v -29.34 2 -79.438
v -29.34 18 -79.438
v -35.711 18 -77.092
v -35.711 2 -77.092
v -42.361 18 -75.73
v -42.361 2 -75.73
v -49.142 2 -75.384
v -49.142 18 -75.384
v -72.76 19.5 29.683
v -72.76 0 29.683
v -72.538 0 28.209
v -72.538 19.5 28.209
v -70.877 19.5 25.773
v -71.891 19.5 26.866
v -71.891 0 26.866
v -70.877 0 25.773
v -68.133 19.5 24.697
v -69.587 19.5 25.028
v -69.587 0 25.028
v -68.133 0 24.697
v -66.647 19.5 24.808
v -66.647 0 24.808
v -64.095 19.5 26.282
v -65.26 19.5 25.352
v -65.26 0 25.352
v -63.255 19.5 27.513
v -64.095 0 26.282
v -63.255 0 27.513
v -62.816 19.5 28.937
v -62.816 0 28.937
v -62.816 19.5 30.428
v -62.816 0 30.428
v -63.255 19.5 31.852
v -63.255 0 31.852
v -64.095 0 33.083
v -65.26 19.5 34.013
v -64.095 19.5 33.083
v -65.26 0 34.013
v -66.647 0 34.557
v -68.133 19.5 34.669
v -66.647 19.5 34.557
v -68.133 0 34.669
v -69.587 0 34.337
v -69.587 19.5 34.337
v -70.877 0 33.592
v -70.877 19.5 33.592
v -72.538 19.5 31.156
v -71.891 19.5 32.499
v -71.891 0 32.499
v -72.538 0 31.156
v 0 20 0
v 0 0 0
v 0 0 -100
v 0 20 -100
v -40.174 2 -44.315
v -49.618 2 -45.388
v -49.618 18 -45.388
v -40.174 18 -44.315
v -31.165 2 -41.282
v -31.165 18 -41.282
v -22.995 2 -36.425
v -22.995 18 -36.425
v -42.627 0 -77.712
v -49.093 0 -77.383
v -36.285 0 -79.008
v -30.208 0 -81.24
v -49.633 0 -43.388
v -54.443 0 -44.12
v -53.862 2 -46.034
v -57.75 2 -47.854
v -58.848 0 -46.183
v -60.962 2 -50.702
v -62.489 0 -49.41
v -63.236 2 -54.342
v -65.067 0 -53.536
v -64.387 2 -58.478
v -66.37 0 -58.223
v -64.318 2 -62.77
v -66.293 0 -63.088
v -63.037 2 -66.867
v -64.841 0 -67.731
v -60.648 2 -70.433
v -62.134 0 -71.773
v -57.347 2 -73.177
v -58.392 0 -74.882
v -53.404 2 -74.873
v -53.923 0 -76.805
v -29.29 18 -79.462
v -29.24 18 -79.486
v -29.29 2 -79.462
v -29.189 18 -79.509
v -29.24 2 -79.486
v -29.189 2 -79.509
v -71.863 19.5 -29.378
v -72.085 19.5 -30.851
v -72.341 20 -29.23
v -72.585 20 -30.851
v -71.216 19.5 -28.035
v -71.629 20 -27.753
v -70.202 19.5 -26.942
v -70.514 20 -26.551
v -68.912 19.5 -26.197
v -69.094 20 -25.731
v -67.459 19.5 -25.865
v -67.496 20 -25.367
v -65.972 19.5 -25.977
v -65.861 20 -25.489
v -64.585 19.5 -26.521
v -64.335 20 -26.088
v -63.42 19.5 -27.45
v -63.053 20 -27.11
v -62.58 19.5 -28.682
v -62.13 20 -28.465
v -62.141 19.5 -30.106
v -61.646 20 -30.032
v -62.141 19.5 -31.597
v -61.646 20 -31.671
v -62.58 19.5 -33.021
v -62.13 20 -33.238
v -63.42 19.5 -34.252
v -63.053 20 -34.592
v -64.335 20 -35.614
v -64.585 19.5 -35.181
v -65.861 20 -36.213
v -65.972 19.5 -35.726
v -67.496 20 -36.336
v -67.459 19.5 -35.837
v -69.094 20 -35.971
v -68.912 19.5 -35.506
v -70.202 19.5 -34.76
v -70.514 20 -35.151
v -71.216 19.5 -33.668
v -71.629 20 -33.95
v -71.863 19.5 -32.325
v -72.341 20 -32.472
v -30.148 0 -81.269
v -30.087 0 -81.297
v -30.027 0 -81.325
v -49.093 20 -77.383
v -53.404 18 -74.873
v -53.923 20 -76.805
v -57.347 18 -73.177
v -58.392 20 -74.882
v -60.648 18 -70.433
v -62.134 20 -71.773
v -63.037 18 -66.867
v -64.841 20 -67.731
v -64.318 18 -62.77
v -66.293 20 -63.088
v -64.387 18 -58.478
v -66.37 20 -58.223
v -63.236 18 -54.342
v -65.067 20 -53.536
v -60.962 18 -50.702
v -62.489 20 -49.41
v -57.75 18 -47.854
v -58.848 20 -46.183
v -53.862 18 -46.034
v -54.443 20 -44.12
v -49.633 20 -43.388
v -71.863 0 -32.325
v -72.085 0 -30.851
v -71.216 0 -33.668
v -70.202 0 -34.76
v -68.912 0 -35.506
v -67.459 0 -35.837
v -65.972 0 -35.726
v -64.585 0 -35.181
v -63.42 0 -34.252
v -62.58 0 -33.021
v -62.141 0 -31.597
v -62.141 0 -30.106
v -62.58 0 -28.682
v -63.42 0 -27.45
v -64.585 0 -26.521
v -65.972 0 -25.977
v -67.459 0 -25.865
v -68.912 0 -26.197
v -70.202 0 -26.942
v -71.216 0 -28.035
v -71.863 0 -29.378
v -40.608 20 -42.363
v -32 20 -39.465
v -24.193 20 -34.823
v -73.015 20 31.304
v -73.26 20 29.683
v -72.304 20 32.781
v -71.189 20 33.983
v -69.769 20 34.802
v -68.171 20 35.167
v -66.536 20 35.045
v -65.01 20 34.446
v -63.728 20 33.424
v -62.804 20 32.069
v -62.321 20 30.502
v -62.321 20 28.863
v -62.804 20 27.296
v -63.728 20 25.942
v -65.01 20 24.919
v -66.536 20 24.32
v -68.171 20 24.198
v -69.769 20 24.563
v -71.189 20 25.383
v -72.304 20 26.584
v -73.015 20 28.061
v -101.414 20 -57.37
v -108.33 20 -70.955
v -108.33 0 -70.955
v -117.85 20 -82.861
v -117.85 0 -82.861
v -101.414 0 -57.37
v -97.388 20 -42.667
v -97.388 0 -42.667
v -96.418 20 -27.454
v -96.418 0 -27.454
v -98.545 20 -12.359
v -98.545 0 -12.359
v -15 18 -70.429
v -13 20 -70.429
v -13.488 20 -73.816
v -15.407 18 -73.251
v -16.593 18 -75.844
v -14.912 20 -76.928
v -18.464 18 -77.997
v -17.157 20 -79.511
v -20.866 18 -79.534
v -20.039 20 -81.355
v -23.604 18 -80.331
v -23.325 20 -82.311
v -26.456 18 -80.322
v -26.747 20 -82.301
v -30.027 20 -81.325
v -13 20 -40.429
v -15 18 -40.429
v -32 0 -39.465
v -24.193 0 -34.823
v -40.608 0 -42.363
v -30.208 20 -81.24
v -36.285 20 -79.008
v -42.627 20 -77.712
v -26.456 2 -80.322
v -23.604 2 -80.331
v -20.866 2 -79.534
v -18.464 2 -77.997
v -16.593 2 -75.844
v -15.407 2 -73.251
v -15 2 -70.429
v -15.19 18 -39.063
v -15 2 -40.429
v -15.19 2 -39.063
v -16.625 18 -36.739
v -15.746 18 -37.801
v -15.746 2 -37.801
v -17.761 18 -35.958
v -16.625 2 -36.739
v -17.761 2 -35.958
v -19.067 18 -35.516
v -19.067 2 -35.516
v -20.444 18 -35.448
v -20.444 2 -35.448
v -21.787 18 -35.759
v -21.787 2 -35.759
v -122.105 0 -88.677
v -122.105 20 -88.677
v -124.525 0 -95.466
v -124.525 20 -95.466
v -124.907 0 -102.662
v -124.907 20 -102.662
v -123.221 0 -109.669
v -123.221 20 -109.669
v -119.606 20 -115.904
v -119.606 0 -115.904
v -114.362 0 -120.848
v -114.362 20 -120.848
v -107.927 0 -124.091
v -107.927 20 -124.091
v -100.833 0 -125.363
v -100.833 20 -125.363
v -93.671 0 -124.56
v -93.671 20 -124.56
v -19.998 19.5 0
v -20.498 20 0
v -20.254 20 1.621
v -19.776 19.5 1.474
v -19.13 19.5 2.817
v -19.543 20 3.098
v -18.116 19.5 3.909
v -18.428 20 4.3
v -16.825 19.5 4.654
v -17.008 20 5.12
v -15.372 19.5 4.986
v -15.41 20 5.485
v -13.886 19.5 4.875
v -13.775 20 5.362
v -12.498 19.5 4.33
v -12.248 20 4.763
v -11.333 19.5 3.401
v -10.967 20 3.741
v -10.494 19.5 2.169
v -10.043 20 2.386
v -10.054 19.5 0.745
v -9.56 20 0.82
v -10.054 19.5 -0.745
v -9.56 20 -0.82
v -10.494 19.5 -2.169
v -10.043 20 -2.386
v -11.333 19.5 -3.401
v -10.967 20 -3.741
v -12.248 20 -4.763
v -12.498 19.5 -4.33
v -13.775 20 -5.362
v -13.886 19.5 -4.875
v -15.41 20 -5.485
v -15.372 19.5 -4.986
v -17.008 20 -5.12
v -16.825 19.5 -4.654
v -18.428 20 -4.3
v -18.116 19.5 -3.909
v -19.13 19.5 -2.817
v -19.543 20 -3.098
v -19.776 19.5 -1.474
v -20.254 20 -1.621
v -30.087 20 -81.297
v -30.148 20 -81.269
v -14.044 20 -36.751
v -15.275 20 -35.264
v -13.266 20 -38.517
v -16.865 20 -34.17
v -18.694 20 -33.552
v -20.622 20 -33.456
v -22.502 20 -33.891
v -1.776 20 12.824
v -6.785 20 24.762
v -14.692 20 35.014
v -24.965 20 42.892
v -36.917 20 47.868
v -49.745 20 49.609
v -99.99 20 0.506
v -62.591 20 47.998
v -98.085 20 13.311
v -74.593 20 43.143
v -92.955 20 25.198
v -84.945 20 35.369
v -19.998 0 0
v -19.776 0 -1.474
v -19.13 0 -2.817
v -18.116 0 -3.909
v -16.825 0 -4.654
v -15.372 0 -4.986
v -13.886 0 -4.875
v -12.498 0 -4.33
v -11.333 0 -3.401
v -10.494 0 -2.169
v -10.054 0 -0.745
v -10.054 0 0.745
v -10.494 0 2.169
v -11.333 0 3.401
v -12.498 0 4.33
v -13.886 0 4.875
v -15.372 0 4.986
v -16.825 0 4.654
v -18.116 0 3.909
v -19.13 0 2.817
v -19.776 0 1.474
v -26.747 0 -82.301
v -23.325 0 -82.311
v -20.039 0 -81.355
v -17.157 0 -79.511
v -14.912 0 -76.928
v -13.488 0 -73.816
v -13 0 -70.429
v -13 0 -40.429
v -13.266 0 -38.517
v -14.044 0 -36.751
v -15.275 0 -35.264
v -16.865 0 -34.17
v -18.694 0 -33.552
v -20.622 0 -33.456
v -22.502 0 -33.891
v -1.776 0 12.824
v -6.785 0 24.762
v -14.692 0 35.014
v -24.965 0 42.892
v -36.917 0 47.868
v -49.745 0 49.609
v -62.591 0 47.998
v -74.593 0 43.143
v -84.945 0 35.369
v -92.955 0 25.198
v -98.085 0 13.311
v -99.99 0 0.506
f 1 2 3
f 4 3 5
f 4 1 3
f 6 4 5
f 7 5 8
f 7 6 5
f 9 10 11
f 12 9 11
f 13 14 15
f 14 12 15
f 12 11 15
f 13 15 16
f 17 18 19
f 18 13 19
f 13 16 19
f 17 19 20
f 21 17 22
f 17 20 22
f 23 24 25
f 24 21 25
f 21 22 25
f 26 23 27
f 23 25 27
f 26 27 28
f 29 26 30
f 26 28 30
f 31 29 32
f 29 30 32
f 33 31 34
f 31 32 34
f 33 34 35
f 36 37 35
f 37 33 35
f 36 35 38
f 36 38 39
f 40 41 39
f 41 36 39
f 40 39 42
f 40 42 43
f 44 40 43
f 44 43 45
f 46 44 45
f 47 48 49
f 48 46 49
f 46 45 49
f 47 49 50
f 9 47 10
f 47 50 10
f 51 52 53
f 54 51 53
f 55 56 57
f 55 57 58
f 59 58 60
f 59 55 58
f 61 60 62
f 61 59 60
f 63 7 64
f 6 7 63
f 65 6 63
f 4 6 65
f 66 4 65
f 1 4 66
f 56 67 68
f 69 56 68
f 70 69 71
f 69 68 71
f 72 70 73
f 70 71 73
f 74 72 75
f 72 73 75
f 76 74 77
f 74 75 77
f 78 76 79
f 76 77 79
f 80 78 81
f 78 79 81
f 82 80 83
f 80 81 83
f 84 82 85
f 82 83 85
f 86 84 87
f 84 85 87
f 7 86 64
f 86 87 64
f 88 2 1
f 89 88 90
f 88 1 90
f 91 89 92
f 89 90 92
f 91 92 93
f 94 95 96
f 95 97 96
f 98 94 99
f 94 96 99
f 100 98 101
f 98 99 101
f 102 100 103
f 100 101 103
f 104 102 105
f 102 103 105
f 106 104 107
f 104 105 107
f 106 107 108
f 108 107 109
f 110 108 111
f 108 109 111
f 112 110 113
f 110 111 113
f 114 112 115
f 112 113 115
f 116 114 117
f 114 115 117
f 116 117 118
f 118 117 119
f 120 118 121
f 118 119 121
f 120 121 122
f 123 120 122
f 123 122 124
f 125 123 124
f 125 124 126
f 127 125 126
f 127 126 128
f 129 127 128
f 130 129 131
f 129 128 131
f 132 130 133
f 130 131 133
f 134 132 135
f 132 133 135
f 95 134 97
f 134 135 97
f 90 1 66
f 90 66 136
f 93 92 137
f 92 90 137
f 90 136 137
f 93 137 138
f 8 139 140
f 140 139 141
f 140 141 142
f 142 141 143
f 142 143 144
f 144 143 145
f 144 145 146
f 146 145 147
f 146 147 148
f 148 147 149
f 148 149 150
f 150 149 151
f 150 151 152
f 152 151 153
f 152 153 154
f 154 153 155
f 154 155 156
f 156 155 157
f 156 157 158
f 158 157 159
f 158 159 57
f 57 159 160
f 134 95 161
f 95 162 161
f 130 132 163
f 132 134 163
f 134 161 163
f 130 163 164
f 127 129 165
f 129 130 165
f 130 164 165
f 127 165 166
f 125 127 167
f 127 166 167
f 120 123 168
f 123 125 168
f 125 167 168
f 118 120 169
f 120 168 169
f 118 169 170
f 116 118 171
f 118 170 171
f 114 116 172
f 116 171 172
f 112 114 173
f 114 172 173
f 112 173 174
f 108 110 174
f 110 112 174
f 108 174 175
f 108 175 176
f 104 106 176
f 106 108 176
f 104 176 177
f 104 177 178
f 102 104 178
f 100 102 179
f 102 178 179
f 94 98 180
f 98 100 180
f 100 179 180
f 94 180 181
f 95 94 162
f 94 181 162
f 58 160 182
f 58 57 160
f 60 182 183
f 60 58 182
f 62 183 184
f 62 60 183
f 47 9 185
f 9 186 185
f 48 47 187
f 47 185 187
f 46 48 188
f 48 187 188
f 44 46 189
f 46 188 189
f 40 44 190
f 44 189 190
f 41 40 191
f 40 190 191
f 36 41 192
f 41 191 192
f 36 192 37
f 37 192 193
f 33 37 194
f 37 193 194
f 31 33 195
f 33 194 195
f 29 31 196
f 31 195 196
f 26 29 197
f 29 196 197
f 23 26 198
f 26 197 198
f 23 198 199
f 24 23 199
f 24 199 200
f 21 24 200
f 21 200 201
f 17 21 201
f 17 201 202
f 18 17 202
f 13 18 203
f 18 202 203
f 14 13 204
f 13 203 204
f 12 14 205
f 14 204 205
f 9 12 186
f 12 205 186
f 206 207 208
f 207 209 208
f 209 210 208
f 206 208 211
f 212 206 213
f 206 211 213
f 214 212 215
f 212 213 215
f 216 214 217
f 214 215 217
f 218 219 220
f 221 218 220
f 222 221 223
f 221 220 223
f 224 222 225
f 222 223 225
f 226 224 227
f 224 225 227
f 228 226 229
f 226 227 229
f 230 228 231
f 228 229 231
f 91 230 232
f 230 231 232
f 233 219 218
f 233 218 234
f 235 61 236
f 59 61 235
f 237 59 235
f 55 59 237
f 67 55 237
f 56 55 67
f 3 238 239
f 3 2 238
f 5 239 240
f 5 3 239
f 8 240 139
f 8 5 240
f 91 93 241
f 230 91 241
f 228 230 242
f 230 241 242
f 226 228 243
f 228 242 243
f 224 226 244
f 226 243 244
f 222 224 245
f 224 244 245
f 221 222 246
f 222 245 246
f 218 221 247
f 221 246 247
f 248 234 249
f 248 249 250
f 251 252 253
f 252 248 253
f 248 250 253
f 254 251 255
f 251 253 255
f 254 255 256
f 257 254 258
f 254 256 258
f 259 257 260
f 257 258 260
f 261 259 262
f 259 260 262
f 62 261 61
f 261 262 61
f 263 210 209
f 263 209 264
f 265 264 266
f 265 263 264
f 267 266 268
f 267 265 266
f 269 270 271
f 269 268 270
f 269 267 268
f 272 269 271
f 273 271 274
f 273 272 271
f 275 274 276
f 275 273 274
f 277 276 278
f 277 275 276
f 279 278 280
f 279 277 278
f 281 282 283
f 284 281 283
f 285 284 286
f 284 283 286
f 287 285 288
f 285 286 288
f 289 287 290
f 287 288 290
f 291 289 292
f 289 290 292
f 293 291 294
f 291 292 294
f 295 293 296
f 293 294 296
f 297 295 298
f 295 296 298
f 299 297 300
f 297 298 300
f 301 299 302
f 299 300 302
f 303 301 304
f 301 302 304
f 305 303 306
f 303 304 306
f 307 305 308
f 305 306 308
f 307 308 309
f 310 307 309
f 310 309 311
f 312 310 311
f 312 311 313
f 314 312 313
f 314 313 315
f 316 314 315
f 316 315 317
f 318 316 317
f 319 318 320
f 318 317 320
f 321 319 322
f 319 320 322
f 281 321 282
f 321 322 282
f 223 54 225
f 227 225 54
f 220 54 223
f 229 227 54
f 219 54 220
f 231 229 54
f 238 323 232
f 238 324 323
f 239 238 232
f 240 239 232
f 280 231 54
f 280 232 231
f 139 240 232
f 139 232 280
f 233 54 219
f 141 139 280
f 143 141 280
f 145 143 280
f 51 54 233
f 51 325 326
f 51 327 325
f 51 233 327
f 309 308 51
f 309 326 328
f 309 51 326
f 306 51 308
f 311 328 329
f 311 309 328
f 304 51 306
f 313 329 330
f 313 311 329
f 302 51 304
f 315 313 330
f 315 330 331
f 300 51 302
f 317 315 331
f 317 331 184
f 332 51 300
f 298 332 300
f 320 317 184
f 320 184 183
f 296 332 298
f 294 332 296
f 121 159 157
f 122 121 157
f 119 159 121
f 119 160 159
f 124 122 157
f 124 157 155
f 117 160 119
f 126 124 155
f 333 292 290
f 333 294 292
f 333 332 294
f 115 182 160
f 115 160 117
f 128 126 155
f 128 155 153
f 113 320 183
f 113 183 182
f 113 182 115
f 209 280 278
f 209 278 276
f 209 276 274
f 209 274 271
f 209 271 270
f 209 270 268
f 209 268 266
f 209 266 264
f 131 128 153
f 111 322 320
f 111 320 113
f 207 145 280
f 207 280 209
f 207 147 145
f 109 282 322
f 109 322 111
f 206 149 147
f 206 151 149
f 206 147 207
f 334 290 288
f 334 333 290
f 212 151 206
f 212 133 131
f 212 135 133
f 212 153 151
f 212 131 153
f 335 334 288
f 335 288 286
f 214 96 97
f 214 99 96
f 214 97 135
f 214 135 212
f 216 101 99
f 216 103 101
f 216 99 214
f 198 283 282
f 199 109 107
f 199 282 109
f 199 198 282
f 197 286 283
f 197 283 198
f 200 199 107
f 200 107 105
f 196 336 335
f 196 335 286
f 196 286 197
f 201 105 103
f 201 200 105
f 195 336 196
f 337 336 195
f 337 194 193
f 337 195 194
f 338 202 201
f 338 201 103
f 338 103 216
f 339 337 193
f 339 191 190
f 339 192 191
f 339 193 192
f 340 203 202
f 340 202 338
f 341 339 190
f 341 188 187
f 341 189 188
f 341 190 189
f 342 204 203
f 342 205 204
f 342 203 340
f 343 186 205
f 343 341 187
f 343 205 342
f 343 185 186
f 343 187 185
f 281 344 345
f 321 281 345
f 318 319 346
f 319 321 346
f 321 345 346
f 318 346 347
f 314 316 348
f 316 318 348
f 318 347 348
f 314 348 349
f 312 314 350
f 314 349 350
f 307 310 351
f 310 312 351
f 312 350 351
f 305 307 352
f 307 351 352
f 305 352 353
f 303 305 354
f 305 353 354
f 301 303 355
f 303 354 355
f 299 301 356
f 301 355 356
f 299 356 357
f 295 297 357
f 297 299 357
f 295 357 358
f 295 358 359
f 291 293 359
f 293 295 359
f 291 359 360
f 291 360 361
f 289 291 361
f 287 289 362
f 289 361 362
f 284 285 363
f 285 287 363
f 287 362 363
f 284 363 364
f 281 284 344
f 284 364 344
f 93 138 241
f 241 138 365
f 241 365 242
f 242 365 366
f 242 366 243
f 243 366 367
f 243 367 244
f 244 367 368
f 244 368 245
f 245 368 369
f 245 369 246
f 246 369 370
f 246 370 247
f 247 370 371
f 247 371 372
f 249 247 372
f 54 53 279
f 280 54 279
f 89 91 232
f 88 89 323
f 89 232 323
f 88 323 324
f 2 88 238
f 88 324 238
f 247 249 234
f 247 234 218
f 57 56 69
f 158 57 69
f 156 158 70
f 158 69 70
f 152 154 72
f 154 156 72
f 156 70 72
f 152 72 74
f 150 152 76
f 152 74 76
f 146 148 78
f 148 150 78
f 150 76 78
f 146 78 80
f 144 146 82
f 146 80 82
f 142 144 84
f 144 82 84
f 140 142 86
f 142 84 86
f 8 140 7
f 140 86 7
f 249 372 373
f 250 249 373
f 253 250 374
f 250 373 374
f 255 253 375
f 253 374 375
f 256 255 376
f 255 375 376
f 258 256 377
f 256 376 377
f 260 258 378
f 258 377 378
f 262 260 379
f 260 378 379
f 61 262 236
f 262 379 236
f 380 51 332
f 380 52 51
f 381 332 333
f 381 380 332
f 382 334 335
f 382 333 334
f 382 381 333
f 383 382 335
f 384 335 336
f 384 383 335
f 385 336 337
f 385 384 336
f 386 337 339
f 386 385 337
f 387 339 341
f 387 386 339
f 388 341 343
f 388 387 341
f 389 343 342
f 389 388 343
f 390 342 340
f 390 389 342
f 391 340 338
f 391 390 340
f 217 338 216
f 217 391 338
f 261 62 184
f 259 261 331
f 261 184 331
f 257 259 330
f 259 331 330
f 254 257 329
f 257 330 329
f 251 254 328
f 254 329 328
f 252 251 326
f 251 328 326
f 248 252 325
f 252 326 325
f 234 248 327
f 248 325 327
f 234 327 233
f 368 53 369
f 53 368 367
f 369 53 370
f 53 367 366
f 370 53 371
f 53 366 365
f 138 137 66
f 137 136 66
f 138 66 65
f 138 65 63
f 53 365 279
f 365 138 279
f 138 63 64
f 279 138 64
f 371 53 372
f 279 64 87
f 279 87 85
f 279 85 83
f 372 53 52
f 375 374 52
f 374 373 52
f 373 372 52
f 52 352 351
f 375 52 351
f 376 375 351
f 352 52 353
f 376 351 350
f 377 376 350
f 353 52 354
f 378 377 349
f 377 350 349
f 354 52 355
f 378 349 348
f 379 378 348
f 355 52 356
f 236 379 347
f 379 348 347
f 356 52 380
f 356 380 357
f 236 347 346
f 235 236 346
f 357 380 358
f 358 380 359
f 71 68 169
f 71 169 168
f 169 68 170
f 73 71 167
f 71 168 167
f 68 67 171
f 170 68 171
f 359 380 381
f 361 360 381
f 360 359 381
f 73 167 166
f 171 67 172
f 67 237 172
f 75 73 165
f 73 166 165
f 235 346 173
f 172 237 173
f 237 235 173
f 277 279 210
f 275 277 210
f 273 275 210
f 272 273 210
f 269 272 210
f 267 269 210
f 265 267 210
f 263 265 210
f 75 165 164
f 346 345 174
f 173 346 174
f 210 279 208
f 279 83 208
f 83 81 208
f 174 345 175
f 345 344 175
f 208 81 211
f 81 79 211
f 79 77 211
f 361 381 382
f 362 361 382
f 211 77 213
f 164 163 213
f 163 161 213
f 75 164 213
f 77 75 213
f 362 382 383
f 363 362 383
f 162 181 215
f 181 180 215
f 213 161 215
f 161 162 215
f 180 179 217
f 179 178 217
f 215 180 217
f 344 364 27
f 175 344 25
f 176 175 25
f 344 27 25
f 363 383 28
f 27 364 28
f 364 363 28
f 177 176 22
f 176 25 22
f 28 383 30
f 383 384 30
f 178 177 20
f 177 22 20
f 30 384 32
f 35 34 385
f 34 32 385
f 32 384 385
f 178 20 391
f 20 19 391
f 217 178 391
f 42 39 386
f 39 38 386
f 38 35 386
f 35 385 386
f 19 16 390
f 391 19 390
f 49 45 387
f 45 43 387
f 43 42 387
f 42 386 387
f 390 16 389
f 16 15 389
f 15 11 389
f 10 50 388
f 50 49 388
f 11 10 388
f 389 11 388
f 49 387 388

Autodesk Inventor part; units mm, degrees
ref_plane "YZ Plane" through (0, 0, 0) normal (1, 0, 0) x (0, 1, 0)
ref_plane "XZ Plane" through (0, 0, 0) normal (0, 1, 0) x (-1, 0, 0)
ref_plane "XY Plane" through (0, 0, 0) normal (0, 0, 1) x (1, 0, 0)
sketch "Sketch1" plane through (0, 0, 0) normal (0, 1, 0) x (-1, 0, 0)
  line L0 (0, 0) -> (0, -100)
  arc A0 (93.6713, -124.5596) -> (117.8498, -82.8611) centre (100.0117, -100.377) ccw
  line L1 (0, -100) -> (93.6713, -124.5596)
  arc A1 (98.5447, -12.3594) -> (0, 0) centre (49.9985, -0.39) ccw
  arc A2 (99.0048, -10.5865) -> (117.8498, -82.8611) centre (171.3639, -30.3137) ccw
  arc A3 (49.1416, -75.3835) -> (49.6184, -45.3884) centre (49.5087, -60.388) ccw
  arc A4 (22.9948, -36.4248) -> (49.6184, -45.3884) centre (49.9477, -0.3896) ccw
  line L2 (15, -40.4287) -> (15, -70.4287)
  arc A5 (22.9948, -36.4248) -> (15, -40.4287) centre (20, -40.4287) ccw
  arc A6 (15, -70.4287) -> (29.3397, -79.438) centre (25, -70.4287) ccw
  arc A7 (49.1416, -75.3835) -> (29.1892, -79.5089) centre (48.0406, -120.37) ccw
  circle A8 centre (14.9985, 0) radius 5
  circle A9 centre (67.085, -30.8513) radius 5
  circle A10 centre (67.7598, 29.6826) radius 5
  dimension "d0" = 100
  dimension "d3" = 50
  dimension "d5" = 50
  dimension "d6" = 75
  dimension "d13" = 15
  dimension "d14" = 60
  dimension "d16" = 45
  dimension "d17" = 5
  dimension "d19" = 10
  dimension "d24" = 30
  dimension "d25" = 15
  dimension "d26" = 45
  dimension "d57" = 10
  dimension "d58" = 35
  dimension "d61" = 360
extrude "Extrusion2" add sketch "Sketch1" along normal blind 20
chamfer "Chamfer2" distance 2 angle 45 12 edges at (-64.5068, 20, -60.6264) (-38.9289, 20, -76.3021) (-19.6098, 20, -78.8516) (-15, 20, -55.4287) (-17.761, 20, -35.958) (-35.5892, 20, -43.0373) (-64.5068, 0, -60.6264) (-38.9289, 0, -76.3021) (-19.6098, 0, -78.8516) (-15, 0, -55.4287) (-17.761, 0, -35.958) (-35.5892, 0, -43.0373)
chamfer "Chamfer3" distance 0.5 angle 45 3 edges at (-62.085, 20, -30.8513) (-62.7598, 20, 29.6826) (-9.9985, 20, 0)
thread "Thread1" size "M10x1.25" class "6H" standard "ANSI Metric M Profile" full length
thread "Thread2" size "M10x1.5" class "6H" standard "ANSI Metric M Profile" full length
thread "Thread3" size "M10x1.5" class "6H" standard "ANSI Metric M Profile" full length
properties part number "Curve"
